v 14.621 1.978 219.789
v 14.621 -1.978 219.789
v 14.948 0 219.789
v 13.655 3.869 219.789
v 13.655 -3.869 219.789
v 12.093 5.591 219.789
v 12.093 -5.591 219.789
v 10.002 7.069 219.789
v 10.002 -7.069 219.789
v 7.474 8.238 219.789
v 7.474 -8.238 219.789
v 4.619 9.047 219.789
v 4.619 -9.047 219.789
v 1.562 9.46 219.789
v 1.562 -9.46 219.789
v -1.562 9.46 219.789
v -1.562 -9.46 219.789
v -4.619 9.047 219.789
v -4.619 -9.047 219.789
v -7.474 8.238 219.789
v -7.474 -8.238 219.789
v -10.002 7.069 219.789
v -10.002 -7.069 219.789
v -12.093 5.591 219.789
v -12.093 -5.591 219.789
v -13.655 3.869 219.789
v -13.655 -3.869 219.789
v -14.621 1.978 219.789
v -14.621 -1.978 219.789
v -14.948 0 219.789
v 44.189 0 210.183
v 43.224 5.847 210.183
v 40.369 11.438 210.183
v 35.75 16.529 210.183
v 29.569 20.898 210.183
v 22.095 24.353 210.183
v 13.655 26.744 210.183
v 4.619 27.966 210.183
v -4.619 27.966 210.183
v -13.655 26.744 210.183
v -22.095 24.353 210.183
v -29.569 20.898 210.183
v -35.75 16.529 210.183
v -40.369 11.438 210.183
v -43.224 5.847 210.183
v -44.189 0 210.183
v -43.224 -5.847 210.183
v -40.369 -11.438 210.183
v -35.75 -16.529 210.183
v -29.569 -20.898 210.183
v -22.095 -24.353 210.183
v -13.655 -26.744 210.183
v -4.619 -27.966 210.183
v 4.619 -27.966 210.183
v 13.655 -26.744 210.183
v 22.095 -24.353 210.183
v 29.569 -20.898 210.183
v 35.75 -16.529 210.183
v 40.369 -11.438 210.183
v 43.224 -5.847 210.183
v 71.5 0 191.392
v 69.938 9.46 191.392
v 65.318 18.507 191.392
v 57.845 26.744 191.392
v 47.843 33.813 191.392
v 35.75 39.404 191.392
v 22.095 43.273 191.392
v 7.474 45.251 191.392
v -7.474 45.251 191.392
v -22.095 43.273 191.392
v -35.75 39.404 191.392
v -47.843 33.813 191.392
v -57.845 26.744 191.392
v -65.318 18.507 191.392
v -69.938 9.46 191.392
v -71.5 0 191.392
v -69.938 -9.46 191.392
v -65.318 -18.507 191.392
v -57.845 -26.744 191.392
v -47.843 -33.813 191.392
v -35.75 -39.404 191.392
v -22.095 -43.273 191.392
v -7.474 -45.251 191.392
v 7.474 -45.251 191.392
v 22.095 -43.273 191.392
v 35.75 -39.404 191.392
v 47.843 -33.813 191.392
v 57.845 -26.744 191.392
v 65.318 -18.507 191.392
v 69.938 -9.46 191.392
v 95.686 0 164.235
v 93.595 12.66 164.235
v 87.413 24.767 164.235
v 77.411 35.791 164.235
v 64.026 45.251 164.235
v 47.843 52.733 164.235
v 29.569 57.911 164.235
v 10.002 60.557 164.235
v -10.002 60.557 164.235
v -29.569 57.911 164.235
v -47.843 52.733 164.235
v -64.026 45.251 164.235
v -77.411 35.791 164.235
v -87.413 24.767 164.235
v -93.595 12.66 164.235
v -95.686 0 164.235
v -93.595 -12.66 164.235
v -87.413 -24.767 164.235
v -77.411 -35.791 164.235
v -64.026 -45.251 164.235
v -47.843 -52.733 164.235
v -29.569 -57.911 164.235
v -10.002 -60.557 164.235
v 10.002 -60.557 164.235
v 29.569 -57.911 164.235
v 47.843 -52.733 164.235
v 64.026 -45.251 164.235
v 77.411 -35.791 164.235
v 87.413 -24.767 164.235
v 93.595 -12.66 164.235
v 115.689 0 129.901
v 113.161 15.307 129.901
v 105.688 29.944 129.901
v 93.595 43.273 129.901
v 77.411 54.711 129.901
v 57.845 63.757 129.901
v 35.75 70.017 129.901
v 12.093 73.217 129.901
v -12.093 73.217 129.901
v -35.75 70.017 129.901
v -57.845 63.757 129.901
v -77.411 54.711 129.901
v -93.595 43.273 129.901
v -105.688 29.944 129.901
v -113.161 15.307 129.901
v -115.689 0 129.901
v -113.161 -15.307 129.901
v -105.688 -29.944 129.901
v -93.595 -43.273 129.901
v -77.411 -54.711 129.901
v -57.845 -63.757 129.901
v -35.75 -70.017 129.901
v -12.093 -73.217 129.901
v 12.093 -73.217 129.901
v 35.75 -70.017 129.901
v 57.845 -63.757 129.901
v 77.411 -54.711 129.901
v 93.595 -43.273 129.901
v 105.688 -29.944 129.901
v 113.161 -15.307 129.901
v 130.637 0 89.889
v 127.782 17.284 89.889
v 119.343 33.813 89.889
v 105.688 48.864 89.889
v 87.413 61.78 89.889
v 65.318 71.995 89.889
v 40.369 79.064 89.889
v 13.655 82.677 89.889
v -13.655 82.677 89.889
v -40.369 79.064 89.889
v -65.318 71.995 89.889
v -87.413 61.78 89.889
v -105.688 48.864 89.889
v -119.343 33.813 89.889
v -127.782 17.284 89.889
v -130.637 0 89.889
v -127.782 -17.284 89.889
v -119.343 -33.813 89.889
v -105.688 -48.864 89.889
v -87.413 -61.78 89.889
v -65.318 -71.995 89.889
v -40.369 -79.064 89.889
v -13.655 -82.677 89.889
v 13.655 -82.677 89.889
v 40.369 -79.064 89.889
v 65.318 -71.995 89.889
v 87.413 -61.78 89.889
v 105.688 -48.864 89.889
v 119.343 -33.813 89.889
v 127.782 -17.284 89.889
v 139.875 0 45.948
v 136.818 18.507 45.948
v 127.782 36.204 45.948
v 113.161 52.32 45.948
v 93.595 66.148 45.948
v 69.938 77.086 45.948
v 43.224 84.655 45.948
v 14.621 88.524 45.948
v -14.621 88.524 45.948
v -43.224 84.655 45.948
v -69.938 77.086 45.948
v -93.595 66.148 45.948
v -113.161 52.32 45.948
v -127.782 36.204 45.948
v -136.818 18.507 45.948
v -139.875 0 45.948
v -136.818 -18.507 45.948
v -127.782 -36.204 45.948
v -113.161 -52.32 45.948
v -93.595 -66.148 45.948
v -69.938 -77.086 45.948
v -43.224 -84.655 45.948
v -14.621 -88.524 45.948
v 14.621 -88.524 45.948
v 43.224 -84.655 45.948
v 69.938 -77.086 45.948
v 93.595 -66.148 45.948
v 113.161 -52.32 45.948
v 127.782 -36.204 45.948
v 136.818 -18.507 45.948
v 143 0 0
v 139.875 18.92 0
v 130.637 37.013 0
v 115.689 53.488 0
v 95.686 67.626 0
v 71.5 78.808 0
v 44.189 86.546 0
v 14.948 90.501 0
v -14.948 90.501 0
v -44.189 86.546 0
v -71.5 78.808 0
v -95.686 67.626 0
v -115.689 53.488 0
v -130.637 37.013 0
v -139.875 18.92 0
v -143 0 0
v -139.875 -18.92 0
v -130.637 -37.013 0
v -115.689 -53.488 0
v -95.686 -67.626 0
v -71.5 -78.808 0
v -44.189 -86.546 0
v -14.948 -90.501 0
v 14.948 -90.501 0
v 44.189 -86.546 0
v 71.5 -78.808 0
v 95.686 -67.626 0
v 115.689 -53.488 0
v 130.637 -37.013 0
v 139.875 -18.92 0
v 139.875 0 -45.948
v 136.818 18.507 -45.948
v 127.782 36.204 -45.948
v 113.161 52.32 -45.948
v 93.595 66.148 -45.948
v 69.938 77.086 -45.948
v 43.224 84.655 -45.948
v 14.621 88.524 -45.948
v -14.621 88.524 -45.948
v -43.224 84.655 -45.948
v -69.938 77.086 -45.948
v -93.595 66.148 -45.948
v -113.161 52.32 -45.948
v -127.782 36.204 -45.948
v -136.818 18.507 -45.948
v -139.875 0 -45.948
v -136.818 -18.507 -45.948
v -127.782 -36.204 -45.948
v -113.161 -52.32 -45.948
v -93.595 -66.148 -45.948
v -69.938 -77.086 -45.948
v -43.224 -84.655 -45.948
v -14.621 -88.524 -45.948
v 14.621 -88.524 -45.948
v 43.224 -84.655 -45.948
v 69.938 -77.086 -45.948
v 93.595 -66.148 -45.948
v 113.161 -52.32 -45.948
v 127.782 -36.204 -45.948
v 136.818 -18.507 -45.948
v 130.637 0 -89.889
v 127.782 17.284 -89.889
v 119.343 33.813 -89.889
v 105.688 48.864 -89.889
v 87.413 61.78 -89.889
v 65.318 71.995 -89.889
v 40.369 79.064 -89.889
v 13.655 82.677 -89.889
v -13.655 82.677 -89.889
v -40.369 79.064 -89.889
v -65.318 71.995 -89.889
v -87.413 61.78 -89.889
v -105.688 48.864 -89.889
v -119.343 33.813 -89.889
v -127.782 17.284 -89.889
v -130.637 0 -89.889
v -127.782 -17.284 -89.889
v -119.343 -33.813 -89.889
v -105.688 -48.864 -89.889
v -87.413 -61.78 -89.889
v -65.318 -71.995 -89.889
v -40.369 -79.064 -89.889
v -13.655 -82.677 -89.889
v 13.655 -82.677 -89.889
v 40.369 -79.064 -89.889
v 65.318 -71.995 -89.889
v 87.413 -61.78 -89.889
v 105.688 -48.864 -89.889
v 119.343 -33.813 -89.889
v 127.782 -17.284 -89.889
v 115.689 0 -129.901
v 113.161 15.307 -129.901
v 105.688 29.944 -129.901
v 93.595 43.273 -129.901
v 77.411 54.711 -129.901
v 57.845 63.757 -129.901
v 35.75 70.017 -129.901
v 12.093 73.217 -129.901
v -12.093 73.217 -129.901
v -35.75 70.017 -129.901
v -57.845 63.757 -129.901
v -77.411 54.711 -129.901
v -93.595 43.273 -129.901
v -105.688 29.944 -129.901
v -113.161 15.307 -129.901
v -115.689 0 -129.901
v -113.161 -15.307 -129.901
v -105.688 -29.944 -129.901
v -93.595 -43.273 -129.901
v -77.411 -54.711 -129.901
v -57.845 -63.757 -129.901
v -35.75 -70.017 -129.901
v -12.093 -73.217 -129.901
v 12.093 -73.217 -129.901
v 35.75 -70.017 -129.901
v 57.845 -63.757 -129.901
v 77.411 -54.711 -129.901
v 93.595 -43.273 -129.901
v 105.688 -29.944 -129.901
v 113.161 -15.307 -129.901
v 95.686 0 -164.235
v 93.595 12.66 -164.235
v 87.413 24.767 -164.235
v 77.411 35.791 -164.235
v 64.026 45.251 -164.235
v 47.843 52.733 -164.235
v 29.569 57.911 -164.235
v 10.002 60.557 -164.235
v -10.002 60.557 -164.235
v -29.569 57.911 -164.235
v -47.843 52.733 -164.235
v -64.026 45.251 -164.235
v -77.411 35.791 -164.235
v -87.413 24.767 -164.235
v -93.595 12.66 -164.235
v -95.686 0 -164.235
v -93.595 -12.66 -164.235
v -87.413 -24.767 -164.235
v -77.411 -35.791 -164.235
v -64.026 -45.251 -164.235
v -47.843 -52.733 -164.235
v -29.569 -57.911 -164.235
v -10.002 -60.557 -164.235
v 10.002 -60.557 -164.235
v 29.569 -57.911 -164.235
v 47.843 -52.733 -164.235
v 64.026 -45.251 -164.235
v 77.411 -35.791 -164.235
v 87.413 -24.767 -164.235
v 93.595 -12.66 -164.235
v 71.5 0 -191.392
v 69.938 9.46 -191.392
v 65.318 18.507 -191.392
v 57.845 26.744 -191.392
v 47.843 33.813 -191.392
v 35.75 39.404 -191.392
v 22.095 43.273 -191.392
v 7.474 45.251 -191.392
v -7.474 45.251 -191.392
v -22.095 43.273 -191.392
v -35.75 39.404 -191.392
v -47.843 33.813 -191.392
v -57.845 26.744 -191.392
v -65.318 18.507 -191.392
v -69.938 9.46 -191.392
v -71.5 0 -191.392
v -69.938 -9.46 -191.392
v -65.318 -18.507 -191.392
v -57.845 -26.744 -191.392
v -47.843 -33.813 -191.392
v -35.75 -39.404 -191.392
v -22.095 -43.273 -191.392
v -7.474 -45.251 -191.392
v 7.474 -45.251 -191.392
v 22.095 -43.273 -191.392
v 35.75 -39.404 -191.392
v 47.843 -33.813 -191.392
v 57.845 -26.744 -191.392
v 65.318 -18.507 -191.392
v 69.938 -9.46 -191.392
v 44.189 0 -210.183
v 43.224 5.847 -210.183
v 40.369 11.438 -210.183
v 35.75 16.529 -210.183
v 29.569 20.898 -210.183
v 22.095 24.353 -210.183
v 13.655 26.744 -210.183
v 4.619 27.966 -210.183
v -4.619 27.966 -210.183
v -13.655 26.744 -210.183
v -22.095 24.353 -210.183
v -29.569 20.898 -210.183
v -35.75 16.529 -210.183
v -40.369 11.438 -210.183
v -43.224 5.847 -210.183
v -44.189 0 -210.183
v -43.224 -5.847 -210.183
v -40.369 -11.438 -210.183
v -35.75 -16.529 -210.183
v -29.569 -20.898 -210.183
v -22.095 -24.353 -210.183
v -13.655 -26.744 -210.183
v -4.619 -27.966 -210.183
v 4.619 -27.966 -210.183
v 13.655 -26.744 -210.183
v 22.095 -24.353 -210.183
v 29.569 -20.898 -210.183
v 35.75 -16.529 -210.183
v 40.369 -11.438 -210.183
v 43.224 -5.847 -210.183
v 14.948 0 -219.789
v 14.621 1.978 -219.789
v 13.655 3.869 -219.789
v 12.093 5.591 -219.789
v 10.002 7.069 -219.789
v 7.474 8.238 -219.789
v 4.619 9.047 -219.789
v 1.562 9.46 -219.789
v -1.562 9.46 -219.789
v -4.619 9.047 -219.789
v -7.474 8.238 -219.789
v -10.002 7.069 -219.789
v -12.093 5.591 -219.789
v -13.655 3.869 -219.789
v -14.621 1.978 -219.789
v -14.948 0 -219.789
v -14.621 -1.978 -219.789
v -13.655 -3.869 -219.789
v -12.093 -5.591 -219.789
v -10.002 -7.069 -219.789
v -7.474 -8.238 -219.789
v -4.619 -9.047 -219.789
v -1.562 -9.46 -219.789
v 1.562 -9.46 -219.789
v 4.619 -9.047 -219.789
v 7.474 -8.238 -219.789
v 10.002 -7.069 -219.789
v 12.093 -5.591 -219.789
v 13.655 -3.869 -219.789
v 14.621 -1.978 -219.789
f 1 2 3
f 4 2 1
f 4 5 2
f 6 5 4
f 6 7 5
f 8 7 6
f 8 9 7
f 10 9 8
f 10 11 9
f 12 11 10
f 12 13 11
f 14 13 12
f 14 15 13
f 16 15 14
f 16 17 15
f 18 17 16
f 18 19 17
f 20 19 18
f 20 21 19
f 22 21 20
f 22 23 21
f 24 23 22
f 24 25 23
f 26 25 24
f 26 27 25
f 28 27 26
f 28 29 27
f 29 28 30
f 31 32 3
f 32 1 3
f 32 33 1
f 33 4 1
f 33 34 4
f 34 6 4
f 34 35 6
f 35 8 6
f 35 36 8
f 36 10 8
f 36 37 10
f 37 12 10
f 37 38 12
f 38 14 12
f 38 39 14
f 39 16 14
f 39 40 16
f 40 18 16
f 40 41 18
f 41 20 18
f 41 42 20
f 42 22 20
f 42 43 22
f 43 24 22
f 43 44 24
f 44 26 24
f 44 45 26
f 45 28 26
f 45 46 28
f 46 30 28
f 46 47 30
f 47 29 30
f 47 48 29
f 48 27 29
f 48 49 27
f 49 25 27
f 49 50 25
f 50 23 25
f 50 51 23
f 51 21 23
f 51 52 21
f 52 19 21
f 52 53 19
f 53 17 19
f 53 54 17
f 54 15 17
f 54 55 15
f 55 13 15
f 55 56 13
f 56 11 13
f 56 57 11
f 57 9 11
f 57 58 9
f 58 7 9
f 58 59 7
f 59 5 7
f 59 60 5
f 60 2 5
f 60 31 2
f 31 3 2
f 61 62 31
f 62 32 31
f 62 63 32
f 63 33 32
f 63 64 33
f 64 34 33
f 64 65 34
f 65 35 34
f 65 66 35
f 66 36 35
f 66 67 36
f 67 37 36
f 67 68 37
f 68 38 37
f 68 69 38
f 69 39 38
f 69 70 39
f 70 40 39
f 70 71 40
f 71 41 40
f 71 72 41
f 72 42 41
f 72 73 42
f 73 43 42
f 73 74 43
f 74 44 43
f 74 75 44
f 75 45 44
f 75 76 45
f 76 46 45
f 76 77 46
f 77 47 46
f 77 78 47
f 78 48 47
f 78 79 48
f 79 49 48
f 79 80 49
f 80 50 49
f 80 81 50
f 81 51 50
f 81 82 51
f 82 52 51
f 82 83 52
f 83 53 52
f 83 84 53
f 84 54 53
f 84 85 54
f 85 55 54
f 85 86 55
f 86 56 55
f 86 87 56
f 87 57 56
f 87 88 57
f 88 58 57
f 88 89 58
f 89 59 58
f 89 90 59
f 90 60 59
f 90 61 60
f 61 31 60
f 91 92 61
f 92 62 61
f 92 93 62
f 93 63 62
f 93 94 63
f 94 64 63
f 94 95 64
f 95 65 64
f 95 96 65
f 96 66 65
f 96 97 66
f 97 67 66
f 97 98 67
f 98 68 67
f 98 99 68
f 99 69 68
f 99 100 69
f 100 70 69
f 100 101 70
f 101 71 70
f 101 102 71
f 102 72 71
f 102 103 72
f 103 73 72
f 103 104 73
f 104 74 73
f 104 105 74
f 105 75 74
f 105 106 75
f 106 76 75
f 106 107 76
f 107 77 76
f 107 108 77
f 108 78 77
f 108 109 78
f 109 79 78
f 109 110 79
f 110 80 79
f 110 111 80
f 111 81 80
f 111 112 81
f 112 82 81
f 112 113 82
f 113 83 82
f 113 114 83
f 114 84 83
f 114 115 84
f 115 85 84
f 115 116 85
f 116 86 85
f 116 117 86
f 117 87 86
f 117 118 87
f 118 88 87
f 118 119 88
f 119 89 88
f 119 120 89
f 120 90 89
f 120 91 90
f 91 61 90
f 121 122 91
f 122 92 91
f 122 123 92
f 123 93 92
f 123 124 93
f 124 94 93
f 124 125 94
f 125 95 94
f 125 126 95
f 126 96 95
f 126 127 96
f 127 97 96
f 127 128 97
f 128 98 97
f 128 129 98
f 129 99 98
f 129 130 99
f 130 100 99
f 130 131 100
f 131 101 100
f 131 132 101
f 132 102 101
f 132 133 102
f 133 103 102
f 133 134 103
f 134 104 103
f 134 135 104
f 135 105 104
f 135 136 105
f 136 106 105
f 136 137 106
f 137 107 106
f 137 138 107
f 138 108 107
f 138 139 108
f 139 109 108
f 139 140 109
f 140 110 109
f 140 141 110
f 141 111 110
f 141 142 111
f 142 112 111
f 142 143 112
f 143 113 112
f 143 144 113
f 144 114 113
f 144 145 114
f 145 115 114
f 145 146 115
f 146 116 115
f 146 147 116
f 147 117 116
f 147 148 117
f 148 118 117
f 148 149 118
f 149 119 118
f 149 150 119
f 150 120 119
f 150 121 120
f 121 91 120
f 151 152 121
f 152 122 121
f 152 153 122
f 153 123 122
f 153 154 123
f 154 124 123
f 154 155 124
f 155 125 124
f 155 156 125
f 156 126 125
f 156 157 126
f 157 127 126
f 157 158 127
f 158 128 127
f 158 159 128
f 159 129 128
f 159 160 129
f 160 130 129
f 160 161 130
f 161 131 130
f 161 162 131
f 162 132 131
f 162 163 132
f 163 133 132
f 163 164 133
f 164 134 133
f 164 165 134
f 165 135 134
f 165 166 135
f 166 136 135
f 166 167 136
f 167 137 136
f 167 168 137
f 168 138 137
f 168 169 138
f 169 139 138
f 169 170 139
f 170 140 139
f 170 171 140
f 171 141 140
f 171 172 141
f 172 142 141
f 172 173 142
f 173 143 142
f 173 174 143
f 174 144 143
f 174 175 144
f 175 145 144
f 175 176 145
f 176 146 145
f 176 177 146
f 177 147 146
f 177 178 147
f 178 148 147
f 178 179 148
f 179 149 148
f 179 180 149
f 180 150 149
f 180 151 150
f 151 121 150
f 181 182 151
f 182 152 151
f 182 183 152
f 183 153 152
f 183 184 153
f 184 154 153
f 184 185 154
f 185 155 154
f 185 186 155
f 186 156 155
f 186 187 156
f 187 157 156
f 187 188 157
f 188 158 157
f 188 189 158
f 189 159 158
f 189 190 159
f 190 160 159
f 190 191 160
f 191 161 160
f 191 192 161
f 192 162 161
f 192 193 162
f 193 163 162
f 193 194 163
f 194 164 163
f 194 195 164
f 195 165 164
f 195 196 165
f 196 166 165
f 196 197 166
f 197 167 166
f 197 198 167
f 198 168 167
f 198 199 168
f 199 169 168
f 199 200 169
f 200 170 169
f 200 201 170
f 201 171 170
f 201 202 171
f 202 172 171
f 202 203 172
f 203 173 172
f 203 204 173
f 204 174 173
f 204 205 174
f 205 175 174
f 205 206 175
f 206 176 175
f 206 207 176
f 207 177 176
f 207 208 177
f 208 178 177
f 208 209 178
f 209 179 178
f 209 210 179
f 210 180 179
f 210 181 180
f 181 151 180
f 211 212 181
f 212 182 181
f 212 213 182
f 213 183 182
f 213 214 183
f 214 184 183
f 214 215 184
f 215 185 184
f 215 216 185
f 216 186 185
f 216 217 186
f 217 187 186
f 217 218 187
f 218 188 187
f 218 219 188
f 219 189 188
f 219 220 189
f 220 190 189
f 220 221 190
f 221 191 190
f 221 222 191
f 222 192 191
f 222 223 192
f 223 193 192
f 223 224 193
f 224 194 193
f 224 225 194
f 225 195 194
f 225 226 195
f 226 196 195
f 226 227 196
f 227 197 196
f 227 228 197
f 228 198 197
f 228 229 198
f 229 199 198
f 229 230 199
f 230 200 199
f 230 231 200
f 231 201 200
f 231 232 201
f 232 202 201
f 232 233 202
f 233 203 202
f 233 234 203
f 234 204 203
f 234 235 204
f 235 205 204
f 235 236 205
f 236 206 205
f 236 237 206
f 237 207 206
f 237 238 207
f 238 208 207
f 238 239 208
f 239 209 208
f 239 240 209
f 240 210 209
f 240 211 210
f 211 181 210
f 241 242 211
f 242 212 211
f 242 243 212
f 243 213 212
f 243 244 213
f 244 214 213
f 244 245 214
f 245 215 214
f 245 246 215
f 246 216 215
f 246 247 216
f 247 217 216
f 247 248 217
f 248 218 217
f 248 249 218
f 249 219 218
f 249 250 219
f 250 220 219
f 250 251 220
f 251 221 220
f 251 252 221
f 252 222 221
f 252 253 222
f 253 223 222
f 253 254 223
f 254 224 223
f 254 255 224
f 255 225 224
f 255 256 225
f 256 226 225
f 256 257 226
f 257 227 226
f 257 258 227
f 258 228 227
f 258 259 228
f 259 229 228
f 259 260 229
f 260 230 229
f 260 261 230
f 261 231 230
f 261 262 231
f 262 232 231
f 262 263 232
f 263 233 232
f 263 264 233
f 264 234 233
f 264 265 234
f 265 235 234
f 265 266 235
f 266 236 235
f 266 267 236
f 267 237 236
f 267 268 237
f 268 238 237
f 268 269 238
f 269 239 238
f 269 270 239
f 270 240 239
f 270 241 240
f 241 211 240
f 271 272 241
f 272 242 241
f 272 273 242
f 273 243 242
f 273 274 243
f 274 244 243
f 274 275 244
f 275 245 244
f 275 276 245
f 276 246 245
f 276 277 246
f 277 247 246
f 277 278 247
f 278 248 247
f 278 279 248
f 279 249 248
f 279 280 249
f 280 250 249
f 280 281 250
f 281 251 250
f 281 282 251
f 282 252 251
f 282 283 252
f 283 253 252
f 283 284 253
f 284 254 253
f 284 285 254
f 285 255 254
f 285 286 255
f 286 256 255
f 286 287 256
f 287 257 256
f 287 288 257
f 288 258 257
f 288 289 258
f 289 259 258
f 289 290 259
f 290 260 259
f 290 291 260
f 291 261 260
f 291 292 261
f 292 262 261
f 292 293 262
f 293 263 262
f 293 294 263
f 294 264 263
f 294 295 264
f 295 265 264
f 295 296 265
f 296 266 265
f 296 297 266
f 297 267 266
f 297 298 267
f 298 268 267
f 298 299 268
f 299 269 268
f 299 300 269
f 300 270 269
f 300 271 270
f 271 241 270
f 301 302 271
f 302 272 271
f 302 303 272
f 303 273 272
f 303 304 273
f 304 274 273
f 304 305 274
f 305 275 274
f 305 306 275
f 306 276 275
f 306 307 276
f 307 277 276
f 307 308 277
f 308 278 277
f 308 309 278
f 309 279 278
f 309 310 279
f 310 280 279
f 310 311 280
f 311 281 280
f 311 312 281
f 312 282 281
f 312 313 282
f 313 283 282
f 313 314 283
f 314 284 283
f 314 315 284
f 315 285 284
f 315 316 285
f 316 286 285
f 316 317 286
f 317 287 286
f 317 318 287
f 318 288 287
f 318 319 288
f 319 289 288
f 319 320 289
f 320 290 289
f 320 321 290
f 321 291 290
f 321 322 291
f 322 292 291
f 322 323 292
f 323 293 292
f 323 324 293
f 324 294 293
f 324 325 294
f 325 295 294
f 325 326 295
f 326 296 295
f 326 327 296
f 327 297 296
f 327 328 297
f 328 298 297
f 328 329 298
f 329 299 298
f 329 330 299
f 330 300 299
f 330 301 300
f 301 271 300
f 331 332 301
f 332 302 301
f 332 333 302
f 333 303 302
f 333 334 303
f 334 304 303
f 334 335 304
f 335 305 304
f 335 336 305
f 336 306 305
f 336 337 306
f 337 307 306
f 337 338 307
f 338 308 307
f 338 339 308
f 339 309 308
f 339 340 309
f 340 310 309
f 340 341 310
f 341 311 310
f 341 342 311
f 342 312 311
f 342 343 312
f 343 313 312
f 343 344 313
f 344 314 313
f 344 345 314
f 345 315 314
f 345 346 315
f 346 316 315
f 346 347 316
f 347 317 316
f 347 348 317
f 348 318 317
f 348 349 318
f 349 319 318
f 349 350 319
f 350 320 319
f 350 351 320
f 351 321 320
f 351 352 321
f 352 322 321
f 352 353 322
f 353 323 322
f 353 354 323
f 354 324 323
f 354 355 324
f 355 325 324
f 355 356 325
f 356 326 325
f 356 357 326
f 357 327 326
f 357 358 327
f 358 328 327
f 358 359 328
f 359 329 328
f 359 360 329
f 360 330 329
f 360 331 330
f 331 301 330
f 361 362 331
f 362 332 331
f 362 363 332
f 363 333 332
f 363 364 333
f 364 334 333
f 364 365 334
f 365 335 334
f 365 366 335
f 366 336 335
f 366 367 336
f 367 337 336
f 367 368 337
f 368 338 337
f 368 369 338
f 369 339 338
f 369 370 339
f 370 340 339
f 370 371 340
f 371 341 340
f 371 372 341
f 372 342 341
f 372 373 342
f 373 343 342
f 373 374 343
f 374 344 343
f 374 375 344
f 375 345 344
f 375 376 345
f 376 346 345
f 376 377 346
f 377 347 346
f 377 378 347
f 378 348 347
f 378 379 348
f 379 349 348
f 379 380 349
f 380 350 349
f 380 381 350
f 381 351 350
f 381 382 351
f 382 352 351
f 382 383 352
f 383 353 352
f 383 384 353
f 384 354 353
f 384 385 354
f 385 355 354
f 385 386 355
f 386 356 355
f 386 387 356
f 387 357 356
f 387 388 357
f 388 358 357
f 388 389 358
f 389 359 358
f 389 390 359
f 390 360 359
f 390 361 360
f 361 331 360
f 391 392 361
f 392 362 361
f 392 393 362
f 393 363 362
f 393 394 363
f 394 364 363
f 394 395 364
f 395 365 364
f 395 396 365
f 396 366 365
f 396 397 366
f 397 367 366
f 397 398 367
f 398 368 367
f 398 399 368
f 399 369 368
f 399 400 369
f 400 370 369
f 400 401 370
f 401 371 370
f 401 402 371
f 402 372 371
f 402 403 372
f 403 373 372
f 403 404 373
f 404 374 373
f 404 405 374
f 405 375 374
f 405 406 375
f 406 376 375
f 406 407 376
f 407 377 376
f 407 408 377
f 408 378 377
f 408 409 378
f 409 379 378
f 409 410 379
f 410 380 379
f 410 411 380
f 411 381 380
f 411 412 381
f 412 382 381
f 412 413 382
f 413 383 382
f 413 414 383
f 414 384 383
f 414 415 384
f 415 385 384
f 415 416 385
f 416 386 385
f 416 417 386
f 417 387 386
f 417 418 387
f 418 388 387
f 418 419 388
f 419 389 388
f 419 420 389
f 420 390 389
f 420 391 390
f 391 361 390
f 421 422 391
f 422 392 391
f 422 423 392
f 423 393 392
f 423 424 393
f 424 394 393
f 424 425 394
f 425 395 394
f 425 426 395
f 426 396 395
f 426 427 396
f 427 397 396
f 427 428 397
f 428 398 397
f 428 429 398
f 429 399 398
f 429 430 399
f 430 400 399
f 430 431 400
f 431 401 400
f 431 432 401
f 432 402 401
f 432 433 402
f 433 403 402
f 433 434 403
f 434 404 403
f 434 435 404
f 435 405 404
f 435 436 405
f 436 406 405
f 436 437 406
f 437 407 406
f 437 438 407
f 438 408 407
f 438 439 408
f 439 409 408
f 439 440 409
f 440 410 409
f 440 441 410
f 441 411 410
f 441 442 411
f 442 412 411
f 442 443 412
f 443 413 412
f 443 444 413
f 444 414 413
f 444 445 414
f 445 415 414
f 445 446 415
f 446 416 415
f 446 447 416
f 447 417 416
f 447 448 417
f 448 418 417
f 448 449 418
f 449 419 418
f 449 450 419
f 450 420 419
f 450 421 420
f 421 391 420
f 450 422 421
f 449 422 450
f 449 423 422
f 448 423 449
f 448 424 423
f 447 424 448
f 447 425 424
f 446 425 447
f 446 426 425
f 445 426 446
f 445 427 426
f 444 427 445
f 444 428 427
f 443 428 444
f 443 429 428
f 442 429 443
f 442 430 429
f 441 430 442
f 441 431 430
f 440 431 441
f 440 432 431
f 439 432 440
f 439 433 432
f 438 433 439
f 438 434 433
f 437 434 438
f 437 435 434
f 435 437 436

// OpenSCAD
// Generated by SolidPython 1.0.1 on 2020-07-29 00:46:49


scale(v = [11, 7, 17]) {
	sphere(r = 13);
}
/***********************************************
*********      SolidPython code:      **********
************************************************
 
# import packages: SolidPython
from solid import *
from solid.utils import *
from itertools import chain, combinations, permutations


class Resize:

    def __init__(self, scad_file):
        self.scad_file = scad_file
        #self.scad_file = import_scad(scad_file)
        # cone/cylinder param:
        self.r1 = 0
        self.r2 = 0
        self.h = 0
        # rectangular prism param:
        self.w = 0
        self.l = 0
        # ellipse param:
        self.r = 0

    # import OpenScad code (file name corresponds to shape)


    # classify shape + parameters
    def assign(self, param1, param2, param3):
        if self.scad_file == 'cone.scad':
            self.r1 = param1
            self.r2 = param2
            self.h = param3
        elif self.scad_file == 'cylinder.scad':
            self.r1 = param1
            self.r2 = param2
            self.h = param3
        elif self.scad_file == 'rectangularPrism.scad':
            self.h = param1
            self.l = param2
            self.w = param3
        else:
            self.r = param1
            self.h = param2

    # resize parameters
    def iterate(self):
        x = range(3, 20, 2)
        i = 1
        if self.scad_file == 'cone.scad':
            tempList = list(permutations(x, 2))
            for temp in tempList:
                param1 = temp[0]
                param2 = temp[1]
                filepath = 'produced_scad_files/' + 'cone' + str(param1) + '_' + str(param2) + '_' + '.scad'
                scad_render_to_file(cylinder(h=param1, r1=param2, r2=0), filepath)

        elif self.scad_file == 'cylinder.scad':
            tempList = list(permutations(x, 3))
            for temp in tempList:
                param1 = temp[0]
                param2 = temp[1]
                filepath = 'produced_scad_files/' + 'cylinder' + str(param1) + '_' + str(param2) + '_' + '.scad'
                scad_render_to_file(cylinder(h=param1, r1=param2, r2=param2), filepath)

        elif self.scad_file == 'rectangularPrism.scad':
            tempList = list(permutations(x, 3))
            for temp in tempList:
                param1 = temp[0]
                param2 = temp[1]
                param3 = temp[2]
                filepath = 'produced_scad_files/' + 'rectangularPrism' + str(param1) + '_' + str(param2) + '_' + str(
                    param3) + '.scad'
                scad_render_to_file(cube(size=(param1, param2, param3)), filepath)

        elif self.scad_file == 'ellipse.scad':
            tempList = list(permutations(x, 4))
            for temp in tempList:
                param1 = temp[0]
                param2 = temp[1]
                param3 = temp[2]
                param4 = temp[3]
                filepath = 'produced_scad_files/' + 'ellipse' + str(param1) + '_' + str(param2) + '_' + str(param3) + '_' + str(param4) + '.scad'
                scad_render_to_file(scale([param1, param2, param3])(sphere(r=param4)), filepath)

    def render_to_scadfile(self):
        scad_render_to_file(scad, 'example.scad') 
 
************************************************/
